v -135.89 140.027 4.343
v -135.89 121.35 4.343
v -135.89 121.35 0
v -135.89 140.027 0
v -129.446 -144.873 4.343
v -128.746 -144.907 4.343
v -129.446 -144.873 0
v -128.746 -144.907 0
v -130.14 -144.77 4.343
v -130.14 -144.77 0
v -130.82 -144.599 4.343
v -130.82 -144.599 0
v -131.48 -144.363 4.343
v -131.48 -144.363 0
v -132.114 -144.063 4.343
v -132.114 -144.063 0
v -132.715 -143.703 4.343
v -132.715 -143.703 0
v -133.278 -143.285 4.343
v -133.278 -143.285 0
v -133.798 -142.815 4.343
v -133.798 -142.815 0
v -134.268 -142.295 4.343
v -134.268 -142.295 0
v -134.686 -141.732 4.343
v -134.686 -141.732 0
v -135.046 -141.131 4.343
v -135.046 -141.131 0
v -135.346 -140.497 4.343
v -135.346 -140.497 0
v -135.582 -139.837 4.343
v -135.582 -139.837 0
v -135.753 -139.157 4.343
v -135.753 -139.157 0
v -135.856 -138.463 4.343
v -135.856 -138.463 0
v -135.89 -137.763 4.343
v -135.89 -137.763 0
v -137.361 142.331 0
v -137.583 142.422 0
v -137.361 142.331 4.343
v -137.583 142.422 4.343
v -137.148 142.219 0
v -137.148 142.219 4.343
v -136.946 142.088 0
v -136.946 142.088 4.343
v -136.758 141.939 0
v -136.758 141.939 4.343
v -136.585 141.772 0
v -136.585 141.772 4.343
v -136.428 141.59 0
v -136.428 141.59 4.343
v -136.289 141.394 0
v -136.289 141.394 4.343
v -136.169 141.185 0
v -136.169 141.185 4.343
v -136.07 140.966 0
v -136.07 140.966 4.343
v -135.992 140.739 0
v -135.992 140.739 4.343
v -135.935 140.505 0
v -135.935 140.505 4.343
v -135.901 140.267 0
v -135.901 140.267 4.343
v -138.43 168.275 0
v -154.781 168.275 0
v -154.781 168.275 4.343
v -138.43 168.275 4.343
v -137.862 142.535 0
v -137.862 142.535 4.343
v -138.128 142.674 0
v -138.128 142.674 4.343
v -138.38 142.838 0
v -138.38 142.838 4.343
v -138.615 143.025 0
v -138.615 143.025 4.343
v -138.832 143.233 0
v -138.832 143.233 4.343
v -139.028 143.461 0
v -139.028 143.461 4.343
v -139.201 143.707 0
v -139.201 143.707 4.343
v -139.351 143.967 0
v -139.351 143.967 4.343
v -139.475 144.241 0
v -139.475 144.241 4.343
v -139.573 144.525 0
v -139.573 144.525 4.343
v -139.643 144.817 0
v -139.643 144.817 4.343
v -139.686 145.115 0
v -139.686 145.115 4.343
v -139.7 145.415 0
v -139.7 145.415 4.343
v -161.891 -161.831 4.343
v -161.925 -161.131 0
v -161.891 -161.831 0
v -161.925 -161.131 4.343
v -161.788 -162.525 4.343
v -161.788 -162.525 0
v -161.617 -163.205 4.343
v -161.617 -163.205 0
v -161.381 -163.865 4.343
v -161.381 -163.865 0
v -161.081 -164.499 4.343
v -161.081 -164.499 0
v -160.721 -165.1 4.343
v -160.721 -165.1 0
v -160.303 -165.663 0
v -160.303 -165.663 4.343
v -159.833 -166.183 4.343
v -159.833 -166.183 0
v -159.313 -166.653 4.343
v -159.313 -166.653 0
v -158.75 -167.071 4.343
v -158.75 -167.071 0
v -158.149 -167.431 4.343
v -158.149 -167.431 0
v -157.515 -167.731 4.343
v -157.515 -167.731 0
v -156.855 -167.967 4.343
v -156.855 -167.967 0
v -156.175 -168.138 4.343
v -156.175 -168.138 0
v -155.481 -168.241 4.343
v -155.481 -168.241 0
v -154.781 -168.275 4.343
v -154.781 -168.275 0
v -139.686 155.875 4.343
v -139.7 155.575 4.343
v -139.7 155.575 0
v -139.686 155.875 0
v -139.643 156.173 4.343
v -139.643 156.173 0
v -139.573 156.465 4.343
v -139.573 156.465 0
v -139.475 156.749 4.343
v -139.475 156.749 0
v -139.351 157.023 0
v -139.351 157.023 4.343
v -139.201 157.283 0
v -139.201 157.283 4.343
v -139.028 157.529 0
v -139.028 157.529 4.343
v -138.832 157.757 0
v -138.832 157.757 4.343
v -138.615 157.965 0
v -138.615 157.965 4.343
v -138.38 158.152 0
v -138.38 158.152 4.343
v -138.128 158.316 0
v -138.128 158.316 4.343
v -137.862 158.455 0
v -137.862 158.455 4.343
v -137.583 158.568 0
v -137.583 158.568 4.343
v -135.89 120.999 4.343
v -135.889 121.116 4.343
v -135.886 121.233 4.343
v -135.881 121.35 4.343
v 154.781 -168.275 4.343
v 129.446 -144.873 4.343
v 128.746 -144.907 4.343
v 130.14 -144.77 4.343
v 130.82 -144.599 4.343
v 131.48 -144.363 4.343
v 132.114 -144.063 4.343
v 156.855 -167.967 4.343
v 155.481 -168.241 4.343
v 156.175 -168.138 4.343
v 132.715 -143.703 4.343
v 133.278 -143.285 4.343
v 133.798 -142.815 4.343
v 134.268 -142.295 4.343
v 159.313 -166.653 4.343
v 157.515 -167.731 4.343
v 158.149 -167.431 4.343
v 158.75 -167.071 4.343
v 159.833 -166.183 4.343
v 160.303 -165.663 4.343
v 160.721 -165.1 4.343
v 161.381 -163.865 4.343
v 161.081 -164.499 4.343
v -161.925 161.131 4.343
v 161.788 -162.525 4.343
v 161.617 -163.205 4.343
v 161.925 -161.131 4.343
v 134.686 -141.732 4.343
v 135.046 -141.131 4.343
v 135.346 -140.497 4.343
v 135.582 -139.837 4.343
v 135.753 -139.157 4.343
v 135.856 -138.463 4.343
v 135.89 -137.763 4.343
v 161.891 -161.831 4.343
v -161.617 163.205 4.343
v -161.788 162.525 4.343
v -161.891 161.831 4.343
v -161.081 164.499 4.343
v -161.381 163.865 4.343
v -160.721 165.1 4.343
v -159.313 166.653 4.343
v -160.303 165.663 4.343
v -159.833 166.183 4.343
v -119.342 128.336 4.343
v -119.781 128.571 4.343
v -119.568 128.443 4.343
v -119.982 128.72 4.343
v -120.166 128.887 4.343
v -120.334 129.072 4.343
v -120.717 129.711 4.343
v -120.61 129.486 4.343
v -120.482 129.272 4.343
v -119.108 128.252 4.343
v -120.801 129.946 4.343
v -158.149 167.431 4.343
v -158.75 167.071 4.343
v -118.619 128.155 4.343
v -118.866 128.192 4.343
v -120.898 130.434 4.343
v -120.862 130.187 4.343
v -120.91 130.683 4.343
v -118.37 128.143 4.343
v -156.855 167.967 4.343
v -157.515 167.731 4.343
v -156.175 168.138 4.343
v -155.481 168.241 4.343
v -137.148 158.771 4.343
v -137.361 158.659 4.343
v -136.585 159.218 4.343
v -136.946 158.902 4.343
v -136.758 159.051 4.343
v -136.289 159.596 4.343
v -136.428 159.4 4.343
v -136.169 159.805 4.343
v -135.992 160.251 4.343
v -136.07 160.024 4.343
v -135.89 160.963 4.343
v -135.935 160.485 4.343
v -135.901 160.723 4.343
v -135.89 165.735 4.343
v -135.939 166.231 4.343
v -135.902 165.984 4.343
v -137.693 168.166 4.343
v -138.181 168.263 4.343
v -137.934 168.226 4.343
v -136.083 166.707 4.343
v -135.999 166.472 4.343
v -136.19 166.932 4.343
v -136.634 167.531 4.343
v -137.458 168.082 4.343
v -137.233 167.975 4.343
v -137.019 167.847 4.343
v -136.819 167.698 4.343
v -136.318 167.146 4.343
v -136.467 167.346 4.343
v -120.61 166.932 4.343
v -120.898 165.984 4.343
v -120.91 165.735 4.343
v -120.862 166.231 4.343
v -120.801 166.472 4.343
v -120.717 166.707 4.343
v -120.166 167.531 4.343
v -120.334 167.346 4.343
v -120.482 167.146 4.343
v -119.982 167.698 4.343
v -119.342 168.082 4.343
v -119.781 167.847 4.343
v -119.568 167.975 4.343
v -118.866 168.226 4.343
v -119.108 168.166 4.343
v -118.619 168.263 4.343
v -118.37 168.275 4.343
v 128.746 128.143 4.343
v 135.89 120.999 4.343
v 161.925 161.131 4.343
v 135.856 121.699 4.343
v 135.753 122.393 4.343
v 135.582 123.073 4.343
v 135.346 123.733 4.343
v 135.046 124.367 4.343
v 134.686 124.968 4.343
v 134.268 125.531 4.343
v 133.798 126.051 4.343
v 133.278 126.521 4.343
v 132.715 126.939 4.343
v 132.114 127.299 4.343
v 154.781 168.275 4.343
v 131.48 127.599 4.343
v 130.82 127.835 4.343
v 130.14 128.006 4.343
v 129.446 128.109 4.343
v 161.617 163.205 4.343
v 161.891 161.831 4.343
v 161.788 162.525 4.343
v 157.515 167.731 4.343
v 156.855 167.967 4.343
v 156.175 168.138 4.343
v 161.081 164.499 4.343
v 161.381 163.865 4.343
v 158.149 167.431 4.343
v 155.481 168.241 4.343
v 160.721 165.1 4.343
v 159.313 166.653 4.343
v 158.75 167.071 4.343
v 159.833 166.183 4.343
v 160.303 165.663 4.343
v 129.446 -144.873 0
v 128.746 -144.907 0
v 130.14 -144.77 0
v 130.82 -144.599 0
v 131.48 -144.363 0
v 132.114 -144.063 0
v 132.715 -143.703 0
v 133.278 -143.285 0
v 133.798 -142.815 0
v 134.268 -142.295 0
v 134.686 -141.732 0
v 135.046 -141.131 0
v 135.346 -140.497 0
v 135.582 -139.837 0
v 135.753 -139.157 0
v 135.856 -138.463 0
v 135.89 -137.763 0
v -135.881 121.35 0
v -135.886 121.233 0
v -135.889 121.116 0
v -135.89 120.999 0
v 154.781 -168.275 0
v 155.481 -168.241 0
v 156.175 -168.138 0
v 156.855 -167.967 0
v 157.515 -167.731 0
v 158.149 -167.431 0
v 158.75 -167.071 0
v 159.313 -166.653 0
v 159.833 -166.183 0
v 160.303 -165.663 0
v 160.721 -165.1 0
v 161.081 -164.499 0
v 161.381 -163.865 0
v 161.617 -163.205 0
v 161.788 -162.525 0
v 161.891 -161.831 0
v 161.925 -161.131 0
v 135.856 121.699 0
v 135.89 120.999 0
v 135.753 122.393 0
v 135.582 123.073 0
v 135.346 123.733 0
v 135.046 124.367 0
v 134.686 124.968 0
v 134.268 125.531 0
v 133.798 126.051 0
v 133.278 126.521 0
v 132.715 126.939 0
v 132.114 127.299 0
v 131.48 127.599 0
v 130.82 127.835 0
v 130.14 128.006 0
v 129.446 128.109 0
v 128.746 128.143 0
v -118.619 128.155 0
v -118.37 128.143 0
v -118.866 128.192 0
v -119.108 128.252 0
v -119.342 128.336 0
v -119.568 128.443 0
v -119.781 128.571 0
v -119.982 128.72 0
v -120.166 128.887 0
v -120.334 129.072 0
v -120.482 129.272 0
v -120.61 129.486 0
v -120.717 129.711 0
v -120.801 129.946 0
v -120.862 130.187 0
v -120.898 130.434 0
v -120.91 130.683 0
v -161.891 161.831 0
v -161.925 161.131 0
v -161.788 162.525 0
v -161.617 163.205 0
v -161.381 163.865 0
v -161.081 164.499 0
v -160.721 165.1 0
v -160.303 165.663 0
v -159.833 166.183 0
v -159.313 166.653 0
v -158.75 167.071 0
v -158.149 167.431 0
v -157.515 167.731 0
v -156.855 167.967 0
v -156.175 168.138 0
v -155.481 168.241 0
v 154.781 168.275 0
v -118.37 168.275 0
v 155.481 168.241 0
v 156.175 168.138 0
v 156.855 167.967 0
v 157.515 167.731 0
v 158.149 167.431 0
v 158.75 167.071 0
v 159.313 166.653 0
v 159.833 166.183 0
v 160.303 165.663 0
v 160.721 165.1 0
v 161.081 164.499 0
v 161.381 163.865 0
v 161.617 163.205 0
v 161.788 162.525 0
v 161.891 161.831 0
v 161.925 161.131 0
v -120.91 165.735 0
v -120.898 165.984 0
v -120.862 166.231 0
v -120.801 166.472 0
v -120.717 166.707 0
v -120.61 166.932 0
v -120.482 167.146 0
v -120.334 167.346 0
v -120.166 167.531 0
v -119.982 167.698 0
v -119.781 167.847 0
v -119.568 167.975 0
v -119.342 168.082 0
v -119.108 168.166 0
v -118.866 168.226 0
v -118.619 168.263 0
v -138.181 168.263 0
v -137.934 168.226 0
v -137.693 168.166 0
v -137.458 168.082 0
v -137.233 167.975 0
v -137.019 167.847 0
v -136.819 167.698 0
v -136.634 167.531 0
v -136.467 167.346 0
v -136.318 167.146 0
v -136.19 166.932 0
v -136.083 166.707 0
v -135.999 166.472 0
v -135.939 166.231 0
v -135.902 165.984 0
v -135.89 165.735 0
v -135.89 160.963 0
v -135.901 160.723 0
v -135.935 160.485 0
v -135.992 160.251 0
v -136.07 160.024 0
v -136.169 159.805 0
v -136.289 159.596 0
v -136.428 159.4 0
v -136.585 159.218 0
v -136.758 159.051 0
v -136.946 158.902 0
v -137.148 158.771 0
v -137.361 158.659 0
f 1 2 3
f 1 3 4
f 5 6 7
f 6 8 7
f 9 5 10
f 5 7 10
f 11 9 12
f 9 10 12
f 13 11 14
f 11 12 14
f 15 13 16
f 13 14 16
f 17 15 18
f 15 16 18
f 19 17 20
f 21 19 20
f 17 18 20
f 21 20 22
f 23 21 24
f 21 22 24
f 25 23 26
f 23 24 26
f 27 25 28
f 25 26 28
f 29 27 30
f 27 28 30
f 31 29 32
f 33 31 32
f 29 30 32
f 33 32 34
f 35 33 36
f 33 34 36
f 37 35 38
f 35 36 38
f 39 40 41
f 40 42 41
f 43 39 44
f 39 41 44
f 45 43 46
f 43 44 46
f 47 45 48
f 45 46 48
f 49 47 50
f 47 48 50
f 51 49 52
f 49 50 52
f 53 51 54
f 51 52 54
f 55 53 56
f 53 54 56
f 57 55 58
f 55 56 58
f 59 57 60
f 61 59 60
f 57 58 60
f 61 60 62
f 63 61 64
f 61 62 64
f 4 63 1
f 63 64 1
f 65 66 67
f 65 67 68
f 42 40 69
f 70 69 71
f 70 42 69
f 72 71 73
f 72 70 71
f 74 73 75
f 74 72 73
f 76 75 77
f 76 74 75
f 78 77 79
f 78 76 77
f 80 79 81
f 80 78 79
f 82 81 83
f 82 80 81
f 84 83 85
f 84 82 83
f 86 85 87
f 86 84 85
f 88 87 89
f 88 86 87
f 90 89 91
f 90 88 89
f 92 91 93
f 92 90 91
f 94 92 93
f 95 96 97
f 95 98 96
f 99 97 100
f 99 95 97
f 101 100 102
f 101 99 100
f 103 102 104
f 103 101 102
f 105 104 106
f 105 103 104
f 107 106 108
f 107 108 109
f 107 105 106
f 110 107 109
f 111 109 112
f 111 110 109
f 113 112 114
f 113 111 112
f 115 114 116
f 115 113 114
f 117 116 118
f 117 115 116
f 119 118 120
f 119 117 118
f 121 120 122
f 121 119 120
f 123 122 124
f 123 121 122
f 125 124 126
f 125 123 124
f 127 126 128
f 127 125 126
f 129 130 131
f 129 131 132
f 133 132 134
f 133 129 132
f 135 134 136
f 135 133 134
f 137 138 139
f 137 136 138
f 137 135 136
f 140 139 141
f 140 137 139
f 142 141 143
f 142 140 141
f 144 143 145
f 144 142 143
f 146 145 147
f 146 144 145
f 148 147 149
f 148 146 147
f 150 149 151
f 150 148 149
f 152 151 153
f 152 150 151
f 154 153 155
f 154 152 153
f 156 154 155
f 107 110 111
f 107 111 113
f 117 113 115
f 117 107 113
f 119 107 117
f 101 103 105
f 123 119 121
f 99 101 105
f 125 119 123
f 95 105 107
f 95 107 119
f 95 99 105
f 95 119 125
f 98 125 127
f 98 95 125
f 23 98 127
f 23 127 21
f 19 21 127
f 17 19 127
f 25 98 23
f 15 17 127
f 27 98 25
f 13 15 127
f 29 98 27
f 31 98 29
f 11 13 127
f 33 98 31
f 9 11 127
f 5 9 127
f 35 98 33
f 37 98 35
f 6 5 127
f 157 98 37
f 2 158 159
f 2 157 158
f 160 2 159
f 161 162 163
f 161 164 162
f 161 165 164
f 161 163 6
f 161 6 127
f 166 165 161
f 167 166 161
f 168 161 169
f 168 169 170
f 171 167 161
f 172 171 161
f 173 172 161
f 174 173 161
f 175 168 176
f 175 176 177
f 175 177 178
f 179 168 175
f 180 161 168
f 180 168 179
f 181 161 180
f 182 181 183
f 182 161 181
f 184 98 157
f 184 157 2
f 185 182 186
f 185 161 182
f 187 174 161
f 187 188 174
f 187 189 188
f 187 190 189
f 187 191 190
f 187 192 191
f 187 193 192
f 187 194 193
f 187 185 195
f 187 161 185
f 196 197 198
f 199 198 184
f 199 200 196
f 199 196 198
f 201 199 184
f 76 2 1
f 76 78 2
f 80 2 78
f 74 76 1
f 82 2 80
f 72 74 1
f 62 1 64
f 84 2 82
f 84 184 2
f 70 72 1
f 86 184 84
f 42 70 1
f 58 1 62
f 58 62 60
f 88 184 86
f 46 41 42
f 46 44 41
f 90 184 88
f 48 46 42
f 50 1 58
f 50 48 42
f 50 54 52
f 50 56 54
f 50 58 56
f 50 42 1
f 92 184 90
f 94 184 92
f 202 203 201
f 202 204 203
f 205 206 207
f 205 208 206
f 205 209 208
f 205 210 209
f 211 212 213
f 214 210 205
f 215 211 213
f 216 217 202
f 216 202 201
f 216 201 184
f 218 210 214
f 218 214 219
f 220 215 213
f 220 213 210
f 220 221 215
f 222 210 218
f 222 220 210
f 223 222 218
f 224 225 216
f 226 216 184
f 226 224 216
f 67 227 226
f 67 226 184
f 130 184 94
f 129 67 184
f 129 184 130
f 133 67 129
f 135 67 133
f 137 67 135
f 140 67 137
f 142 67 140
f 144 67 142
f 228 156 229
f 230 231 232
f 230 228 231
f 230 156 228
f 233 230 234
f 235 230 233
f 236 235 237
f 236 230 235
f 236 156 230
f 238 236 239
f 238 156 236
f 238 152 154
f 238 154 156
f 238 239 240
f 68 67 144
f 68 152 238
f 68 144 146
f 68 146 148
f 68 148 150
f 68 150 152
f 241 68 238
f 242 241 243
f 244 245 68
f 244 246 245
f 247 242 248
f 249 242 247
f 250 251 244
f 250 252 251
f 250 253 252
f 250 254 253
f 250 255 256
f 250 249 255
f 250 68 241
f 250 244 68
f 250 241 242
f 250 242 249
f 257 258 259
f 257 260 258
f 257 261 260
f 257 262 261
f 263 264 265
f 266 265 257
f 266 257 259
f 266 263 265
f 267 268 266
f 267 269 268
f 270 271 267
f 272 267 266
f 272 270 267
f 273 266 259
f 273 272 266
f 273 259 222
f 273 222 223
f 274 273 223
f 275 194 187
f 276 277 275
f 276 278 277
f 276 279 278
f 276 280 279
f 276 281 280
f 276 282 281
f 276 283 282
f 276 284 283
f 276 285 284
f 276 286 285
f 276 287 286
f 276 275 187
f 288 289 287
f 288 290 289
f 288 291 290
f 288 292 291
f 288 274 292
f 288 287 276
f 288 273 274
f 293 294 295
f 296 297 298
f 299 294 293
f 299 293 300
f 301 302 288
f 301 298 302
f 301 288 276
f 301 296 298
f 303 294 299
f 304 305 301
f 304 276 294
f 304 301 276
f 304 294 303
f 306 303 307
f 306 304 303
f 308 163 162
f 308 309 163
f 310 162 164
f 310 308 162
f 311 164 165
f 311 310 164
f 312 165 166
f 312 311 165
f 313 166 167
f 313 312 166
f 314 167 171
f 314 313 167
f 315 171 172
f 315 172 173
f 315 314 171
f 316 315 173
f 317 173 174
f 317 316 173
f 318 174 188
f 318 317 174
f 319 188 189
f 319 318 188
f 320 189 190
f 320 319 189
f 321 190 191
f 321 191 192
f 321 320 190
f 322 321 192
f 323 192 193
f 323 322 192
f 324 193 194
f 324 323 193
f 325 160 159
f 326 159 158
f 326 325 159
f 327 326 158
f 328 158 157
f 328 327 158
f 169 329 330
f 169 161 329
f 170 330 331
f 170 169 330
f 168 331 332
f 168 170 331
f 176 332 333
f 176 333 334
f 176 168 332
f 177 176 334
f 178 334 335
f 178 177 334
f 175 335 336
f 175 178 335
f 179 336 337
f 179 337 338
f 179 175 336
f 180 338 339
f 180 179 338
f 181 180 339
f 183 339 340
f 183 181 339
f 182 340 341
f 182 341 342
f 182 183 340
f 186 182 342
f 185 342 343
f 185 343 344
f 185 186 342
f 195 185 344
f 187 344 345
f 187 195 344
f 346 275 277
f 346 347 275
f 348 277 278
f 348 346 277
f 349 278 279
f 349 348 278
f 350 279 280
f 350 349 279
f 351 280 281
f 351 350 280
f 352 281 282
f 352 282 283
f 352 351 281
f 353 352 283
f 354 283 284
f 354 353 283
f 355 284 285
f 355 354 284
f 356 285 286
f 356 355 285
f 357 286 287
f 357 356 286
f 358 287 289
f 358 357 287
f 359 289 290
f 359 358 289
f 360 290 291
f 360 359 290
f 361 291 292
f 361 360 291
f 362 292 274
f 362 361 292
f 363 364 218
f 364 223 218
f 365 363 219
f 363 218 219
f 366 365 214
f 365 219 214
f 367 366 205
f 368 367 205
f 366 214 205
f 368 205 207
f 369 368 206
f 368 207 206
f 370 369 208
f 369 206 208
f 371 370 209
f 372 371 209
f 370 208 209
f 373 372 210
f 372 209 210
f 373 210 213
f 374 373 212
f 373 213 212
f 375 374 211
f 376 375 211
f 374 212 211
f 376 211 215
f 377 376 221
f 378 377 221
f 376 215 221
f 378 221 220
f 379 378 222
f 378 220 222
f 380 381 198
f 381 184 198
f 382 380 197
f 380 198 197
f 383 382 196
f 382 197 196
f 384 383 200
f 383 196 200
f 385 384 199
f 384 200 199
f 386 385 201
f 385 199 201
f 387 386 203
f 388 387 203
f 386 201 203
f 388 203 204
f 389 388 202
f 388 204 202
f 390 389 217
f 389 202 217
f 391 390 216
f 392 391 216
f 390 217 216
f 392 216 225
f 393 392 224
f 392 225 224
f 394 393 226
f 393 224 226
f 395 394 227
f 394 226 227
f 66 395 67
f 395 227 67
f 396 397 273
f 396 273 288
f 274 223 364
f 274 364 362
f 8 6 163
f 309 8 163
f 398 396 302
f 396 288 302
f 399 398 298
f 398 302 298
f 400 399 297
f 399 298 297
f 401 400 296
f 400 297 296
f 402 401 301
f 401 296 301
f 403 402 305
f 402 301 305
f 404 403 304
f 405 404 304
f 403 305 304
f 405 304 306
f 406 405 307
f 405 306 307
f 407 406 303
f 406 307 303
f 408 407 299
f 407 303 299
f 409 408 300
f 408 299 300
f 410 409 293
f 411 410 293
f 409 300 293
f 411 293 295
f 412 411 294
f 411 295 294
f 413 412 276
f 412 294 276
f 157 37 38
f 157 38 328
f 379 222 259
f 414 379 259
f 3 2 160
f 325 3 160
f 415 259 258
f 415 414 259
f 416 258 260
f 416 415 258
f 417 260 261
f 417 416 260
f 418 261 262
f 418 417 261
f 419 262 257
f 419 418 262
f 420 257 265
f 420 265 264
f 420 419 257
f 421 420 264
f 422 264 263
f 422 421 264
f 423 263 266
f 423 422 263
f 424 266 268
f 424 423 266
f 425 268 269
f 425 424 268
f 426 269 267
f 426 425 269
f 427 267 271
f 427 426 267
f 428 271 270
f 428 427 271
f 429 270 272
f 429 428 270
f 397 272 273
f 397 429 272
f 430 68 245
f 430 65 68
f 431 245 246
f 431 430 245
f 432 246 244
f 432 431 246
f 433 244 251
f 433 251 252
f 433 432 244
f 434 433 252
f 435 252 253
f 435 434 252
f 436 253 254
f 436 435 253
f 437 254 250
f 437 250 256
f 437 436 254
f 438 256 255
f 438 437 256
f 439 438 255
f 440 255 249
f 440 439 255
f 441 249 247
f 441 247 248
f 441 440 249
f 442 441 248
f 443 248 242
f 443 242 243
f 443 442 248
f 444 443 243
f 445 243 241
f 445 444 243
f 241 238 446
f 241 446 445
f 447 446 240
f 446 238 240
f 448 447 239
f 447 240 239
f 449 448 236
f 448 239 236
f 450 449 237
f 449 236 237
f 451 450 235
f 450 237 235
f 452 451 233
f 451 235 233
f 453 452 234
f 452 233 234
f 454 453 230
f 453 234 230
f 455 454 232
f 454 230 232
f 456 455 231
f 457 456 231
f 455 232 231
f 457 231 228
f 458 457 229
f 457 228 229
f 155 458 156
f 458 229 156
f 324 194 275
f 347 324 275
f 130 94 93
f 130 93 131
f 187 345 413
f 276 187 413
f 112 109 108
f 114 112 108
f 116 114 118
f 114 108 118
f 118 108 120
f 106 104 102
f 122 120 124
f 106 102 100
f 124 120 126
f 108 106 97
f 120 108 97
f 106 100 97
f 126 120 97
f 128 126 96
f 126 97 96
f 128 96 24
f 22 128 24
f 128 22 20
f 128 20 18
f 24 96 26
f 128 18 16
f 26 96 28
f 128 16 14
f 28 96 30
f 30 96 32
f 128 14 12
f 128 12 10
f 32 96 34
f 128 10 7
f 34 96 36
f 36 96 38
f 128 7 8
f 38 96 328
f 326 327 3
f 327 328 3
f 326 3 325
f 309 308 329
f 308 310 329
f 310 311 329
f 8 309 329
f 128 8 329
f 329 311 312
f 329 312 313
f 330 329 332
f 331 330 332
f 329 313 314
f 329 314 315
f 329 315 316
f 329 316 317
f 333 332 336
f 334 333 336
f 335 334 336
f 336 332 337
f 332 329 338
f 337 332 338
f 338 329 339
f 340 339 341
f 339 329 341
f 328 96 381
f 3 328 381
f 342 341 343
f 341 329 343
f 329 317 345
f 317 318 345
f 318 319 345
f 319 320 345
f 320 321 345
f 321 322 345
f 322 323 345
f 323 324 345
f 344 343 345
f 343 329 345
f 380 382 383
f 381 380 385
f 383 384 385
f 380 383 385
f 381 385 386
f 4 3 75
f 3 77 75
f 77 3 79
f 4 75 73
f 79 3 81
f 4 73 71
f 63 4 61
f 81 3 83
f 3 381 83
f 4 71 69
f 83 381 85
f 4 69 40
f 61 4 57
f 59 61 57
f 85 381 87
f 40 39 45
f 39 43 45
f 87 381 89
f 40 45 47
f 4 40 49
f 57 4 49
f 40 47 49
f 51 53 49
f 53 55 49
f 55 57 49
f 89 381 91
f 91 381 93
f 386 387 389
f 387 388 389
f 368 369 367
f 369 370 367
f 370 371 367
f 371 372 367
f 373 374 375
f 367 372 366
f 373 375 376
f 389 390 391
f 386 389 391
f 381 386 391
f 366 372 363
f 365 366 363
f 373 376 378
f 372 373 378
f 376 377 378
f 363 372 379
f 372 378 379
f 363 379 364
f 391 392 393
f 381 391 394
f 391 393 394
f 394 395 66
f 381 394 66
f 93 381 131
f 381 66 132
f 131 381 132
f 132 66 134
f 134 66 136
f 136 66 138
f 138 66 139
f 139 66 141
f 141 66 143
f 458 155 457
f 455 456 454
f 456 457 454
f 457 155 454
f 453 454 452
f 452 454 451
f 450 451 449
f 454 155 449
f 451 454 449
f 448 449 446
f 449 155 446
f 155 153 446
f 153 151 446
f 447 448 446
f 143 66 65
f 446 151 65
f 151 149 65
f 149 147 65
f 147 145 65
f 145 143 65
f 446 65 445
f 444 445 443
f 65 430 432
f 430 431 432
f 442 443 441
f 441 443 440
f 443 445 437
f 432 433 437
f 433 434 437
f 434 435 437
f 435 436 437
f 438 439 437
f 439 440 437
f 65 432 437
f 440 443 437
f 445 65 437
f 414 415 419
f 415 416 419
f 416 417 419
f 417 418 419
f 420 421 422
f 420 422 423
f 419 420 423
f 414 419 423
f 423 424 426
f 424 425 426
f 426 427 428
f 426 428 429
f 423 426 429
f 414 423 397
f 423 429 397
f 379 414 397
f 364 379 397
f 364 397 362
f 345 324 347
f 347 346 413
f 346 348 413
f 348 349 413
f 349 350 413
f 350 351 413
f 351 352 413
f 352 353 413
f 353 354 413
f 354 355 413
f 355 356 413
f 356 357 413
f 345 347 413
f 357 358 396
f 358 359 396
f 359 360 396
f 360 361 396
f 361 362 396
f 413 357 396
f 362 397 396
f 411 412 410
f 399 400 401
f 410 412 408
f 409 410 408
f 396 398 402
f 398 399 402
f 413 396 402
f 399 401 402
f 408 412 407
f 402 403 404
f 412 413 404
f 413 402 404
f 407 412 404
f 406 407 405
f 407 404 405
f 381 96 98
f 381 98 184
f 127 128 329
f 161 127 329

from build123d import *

# Parameters (mm, degrees)
SKETCH1_W           = 323.85
SKETCH1_H           = 336.55
BOSS_EXTRUDE1_DEPTH = 4.3434
SKETCH2_W           = 271.78
SKETCH2_H           = 273.05
CUT_EXTRUDE1_DEPTH  = 5.3434
FILLET1_R           = 7.14375
CUT_EXTRUDE2_DEPTH  = 5.3434
SKETCH4_W           = 14.979655554
SKETCH4_H           = 46.925096095
CUT_EXTRUDE3_DEPTH  = 5.3434
FILLET2_R           = 2.54


with BuildPart() as part:
    # Sketch1 → Boss-Extrude1 (new body)
    with BuildSketch(Plane.XY):
        Rectangle(SKETCH1_W, SKETCH1_H)
    extrude(amount=BOSS_EXTRUDE1_DEPTH)

    # Sketch2 → Cut-Extrude1 (cut, through all)
    with BuildSketch(Plane.XY.offset(4.3434)):
        with Locations((0, -8.382)):
            Rectangle(SKETCH2_W, SKETCH2_H)
    extrude(amount=-CUT_EXTRUDE1_DEPTH, mode=Mode.SUBTRACT)

    # Fillet1
    fillet1_edges = [part.edges().sort_by_distance(p)[0] for p in [
        (135.89, 128.143, 2.1717),
        (135.89, -144.907, 2.1717),
        (-135.89, -144.907, 2.1717),
        (-135.89, 128.143, 2.1717),
        (161.925, -168.275, 2.1717),
        (-161.925, -168.275, 2.1717),
        (-161.925, 168.275, 2.1717),
        (161.925, 168.275, 2.1717),
    ]]
    fillet(fillet1_edges, radius=FILLET1_R)

    # Sketch3 → Cut-Extrude2 (cut, through all)
    with BuildSketch(Plane.XY.offset(4.3434)):
        with BuildLine():
            Line((-139.7, 145.415), (-139.7, 155.575))
            ThreePointArc((-139.7, 155.575), (-136.525, 158.75), (-133.35, 155.575))
            Line((-133.35, 155.575), (-133.35, 145.415))
            ThreePointArc((-133.35, 145.415), (-136.525, 142.24), (-139.7, 145.415))
        make_face()
    extrude(amount=-CUT_EXTRUDE2_DEPTH, mode=Mode.SUBTRACT)

    # Sketch4 → Cut-Extrude3 (cut, through all)
    with BuildSketch(Plane.XY.offset(4.3434)):
        with Locations((-128.400172223, 144.812451952)):
            Rectangle(SKETCH4_W, SKETCH4_H)
    extrude(amount=-CUT_EXTRUDE3_DEPTH, mode=Mode.SUBTRACT)

    # Fillet2
    fillet2_edges = [part.edges().sort_by_distance(p)[0] for p in [
        (-120.910344446, 168.275, 2.1717),
        (-135.89, 142.304148027, 2.1717),
        (-135.89, 168.275, 2.1717),
        (-135.89, 158.685851973, 2.1717),
        (-120.910344446, 128.143, 2.1717),
    ]]
    fillet(fillet2_edges, radius=FILLET2_R)


solid = part.part
